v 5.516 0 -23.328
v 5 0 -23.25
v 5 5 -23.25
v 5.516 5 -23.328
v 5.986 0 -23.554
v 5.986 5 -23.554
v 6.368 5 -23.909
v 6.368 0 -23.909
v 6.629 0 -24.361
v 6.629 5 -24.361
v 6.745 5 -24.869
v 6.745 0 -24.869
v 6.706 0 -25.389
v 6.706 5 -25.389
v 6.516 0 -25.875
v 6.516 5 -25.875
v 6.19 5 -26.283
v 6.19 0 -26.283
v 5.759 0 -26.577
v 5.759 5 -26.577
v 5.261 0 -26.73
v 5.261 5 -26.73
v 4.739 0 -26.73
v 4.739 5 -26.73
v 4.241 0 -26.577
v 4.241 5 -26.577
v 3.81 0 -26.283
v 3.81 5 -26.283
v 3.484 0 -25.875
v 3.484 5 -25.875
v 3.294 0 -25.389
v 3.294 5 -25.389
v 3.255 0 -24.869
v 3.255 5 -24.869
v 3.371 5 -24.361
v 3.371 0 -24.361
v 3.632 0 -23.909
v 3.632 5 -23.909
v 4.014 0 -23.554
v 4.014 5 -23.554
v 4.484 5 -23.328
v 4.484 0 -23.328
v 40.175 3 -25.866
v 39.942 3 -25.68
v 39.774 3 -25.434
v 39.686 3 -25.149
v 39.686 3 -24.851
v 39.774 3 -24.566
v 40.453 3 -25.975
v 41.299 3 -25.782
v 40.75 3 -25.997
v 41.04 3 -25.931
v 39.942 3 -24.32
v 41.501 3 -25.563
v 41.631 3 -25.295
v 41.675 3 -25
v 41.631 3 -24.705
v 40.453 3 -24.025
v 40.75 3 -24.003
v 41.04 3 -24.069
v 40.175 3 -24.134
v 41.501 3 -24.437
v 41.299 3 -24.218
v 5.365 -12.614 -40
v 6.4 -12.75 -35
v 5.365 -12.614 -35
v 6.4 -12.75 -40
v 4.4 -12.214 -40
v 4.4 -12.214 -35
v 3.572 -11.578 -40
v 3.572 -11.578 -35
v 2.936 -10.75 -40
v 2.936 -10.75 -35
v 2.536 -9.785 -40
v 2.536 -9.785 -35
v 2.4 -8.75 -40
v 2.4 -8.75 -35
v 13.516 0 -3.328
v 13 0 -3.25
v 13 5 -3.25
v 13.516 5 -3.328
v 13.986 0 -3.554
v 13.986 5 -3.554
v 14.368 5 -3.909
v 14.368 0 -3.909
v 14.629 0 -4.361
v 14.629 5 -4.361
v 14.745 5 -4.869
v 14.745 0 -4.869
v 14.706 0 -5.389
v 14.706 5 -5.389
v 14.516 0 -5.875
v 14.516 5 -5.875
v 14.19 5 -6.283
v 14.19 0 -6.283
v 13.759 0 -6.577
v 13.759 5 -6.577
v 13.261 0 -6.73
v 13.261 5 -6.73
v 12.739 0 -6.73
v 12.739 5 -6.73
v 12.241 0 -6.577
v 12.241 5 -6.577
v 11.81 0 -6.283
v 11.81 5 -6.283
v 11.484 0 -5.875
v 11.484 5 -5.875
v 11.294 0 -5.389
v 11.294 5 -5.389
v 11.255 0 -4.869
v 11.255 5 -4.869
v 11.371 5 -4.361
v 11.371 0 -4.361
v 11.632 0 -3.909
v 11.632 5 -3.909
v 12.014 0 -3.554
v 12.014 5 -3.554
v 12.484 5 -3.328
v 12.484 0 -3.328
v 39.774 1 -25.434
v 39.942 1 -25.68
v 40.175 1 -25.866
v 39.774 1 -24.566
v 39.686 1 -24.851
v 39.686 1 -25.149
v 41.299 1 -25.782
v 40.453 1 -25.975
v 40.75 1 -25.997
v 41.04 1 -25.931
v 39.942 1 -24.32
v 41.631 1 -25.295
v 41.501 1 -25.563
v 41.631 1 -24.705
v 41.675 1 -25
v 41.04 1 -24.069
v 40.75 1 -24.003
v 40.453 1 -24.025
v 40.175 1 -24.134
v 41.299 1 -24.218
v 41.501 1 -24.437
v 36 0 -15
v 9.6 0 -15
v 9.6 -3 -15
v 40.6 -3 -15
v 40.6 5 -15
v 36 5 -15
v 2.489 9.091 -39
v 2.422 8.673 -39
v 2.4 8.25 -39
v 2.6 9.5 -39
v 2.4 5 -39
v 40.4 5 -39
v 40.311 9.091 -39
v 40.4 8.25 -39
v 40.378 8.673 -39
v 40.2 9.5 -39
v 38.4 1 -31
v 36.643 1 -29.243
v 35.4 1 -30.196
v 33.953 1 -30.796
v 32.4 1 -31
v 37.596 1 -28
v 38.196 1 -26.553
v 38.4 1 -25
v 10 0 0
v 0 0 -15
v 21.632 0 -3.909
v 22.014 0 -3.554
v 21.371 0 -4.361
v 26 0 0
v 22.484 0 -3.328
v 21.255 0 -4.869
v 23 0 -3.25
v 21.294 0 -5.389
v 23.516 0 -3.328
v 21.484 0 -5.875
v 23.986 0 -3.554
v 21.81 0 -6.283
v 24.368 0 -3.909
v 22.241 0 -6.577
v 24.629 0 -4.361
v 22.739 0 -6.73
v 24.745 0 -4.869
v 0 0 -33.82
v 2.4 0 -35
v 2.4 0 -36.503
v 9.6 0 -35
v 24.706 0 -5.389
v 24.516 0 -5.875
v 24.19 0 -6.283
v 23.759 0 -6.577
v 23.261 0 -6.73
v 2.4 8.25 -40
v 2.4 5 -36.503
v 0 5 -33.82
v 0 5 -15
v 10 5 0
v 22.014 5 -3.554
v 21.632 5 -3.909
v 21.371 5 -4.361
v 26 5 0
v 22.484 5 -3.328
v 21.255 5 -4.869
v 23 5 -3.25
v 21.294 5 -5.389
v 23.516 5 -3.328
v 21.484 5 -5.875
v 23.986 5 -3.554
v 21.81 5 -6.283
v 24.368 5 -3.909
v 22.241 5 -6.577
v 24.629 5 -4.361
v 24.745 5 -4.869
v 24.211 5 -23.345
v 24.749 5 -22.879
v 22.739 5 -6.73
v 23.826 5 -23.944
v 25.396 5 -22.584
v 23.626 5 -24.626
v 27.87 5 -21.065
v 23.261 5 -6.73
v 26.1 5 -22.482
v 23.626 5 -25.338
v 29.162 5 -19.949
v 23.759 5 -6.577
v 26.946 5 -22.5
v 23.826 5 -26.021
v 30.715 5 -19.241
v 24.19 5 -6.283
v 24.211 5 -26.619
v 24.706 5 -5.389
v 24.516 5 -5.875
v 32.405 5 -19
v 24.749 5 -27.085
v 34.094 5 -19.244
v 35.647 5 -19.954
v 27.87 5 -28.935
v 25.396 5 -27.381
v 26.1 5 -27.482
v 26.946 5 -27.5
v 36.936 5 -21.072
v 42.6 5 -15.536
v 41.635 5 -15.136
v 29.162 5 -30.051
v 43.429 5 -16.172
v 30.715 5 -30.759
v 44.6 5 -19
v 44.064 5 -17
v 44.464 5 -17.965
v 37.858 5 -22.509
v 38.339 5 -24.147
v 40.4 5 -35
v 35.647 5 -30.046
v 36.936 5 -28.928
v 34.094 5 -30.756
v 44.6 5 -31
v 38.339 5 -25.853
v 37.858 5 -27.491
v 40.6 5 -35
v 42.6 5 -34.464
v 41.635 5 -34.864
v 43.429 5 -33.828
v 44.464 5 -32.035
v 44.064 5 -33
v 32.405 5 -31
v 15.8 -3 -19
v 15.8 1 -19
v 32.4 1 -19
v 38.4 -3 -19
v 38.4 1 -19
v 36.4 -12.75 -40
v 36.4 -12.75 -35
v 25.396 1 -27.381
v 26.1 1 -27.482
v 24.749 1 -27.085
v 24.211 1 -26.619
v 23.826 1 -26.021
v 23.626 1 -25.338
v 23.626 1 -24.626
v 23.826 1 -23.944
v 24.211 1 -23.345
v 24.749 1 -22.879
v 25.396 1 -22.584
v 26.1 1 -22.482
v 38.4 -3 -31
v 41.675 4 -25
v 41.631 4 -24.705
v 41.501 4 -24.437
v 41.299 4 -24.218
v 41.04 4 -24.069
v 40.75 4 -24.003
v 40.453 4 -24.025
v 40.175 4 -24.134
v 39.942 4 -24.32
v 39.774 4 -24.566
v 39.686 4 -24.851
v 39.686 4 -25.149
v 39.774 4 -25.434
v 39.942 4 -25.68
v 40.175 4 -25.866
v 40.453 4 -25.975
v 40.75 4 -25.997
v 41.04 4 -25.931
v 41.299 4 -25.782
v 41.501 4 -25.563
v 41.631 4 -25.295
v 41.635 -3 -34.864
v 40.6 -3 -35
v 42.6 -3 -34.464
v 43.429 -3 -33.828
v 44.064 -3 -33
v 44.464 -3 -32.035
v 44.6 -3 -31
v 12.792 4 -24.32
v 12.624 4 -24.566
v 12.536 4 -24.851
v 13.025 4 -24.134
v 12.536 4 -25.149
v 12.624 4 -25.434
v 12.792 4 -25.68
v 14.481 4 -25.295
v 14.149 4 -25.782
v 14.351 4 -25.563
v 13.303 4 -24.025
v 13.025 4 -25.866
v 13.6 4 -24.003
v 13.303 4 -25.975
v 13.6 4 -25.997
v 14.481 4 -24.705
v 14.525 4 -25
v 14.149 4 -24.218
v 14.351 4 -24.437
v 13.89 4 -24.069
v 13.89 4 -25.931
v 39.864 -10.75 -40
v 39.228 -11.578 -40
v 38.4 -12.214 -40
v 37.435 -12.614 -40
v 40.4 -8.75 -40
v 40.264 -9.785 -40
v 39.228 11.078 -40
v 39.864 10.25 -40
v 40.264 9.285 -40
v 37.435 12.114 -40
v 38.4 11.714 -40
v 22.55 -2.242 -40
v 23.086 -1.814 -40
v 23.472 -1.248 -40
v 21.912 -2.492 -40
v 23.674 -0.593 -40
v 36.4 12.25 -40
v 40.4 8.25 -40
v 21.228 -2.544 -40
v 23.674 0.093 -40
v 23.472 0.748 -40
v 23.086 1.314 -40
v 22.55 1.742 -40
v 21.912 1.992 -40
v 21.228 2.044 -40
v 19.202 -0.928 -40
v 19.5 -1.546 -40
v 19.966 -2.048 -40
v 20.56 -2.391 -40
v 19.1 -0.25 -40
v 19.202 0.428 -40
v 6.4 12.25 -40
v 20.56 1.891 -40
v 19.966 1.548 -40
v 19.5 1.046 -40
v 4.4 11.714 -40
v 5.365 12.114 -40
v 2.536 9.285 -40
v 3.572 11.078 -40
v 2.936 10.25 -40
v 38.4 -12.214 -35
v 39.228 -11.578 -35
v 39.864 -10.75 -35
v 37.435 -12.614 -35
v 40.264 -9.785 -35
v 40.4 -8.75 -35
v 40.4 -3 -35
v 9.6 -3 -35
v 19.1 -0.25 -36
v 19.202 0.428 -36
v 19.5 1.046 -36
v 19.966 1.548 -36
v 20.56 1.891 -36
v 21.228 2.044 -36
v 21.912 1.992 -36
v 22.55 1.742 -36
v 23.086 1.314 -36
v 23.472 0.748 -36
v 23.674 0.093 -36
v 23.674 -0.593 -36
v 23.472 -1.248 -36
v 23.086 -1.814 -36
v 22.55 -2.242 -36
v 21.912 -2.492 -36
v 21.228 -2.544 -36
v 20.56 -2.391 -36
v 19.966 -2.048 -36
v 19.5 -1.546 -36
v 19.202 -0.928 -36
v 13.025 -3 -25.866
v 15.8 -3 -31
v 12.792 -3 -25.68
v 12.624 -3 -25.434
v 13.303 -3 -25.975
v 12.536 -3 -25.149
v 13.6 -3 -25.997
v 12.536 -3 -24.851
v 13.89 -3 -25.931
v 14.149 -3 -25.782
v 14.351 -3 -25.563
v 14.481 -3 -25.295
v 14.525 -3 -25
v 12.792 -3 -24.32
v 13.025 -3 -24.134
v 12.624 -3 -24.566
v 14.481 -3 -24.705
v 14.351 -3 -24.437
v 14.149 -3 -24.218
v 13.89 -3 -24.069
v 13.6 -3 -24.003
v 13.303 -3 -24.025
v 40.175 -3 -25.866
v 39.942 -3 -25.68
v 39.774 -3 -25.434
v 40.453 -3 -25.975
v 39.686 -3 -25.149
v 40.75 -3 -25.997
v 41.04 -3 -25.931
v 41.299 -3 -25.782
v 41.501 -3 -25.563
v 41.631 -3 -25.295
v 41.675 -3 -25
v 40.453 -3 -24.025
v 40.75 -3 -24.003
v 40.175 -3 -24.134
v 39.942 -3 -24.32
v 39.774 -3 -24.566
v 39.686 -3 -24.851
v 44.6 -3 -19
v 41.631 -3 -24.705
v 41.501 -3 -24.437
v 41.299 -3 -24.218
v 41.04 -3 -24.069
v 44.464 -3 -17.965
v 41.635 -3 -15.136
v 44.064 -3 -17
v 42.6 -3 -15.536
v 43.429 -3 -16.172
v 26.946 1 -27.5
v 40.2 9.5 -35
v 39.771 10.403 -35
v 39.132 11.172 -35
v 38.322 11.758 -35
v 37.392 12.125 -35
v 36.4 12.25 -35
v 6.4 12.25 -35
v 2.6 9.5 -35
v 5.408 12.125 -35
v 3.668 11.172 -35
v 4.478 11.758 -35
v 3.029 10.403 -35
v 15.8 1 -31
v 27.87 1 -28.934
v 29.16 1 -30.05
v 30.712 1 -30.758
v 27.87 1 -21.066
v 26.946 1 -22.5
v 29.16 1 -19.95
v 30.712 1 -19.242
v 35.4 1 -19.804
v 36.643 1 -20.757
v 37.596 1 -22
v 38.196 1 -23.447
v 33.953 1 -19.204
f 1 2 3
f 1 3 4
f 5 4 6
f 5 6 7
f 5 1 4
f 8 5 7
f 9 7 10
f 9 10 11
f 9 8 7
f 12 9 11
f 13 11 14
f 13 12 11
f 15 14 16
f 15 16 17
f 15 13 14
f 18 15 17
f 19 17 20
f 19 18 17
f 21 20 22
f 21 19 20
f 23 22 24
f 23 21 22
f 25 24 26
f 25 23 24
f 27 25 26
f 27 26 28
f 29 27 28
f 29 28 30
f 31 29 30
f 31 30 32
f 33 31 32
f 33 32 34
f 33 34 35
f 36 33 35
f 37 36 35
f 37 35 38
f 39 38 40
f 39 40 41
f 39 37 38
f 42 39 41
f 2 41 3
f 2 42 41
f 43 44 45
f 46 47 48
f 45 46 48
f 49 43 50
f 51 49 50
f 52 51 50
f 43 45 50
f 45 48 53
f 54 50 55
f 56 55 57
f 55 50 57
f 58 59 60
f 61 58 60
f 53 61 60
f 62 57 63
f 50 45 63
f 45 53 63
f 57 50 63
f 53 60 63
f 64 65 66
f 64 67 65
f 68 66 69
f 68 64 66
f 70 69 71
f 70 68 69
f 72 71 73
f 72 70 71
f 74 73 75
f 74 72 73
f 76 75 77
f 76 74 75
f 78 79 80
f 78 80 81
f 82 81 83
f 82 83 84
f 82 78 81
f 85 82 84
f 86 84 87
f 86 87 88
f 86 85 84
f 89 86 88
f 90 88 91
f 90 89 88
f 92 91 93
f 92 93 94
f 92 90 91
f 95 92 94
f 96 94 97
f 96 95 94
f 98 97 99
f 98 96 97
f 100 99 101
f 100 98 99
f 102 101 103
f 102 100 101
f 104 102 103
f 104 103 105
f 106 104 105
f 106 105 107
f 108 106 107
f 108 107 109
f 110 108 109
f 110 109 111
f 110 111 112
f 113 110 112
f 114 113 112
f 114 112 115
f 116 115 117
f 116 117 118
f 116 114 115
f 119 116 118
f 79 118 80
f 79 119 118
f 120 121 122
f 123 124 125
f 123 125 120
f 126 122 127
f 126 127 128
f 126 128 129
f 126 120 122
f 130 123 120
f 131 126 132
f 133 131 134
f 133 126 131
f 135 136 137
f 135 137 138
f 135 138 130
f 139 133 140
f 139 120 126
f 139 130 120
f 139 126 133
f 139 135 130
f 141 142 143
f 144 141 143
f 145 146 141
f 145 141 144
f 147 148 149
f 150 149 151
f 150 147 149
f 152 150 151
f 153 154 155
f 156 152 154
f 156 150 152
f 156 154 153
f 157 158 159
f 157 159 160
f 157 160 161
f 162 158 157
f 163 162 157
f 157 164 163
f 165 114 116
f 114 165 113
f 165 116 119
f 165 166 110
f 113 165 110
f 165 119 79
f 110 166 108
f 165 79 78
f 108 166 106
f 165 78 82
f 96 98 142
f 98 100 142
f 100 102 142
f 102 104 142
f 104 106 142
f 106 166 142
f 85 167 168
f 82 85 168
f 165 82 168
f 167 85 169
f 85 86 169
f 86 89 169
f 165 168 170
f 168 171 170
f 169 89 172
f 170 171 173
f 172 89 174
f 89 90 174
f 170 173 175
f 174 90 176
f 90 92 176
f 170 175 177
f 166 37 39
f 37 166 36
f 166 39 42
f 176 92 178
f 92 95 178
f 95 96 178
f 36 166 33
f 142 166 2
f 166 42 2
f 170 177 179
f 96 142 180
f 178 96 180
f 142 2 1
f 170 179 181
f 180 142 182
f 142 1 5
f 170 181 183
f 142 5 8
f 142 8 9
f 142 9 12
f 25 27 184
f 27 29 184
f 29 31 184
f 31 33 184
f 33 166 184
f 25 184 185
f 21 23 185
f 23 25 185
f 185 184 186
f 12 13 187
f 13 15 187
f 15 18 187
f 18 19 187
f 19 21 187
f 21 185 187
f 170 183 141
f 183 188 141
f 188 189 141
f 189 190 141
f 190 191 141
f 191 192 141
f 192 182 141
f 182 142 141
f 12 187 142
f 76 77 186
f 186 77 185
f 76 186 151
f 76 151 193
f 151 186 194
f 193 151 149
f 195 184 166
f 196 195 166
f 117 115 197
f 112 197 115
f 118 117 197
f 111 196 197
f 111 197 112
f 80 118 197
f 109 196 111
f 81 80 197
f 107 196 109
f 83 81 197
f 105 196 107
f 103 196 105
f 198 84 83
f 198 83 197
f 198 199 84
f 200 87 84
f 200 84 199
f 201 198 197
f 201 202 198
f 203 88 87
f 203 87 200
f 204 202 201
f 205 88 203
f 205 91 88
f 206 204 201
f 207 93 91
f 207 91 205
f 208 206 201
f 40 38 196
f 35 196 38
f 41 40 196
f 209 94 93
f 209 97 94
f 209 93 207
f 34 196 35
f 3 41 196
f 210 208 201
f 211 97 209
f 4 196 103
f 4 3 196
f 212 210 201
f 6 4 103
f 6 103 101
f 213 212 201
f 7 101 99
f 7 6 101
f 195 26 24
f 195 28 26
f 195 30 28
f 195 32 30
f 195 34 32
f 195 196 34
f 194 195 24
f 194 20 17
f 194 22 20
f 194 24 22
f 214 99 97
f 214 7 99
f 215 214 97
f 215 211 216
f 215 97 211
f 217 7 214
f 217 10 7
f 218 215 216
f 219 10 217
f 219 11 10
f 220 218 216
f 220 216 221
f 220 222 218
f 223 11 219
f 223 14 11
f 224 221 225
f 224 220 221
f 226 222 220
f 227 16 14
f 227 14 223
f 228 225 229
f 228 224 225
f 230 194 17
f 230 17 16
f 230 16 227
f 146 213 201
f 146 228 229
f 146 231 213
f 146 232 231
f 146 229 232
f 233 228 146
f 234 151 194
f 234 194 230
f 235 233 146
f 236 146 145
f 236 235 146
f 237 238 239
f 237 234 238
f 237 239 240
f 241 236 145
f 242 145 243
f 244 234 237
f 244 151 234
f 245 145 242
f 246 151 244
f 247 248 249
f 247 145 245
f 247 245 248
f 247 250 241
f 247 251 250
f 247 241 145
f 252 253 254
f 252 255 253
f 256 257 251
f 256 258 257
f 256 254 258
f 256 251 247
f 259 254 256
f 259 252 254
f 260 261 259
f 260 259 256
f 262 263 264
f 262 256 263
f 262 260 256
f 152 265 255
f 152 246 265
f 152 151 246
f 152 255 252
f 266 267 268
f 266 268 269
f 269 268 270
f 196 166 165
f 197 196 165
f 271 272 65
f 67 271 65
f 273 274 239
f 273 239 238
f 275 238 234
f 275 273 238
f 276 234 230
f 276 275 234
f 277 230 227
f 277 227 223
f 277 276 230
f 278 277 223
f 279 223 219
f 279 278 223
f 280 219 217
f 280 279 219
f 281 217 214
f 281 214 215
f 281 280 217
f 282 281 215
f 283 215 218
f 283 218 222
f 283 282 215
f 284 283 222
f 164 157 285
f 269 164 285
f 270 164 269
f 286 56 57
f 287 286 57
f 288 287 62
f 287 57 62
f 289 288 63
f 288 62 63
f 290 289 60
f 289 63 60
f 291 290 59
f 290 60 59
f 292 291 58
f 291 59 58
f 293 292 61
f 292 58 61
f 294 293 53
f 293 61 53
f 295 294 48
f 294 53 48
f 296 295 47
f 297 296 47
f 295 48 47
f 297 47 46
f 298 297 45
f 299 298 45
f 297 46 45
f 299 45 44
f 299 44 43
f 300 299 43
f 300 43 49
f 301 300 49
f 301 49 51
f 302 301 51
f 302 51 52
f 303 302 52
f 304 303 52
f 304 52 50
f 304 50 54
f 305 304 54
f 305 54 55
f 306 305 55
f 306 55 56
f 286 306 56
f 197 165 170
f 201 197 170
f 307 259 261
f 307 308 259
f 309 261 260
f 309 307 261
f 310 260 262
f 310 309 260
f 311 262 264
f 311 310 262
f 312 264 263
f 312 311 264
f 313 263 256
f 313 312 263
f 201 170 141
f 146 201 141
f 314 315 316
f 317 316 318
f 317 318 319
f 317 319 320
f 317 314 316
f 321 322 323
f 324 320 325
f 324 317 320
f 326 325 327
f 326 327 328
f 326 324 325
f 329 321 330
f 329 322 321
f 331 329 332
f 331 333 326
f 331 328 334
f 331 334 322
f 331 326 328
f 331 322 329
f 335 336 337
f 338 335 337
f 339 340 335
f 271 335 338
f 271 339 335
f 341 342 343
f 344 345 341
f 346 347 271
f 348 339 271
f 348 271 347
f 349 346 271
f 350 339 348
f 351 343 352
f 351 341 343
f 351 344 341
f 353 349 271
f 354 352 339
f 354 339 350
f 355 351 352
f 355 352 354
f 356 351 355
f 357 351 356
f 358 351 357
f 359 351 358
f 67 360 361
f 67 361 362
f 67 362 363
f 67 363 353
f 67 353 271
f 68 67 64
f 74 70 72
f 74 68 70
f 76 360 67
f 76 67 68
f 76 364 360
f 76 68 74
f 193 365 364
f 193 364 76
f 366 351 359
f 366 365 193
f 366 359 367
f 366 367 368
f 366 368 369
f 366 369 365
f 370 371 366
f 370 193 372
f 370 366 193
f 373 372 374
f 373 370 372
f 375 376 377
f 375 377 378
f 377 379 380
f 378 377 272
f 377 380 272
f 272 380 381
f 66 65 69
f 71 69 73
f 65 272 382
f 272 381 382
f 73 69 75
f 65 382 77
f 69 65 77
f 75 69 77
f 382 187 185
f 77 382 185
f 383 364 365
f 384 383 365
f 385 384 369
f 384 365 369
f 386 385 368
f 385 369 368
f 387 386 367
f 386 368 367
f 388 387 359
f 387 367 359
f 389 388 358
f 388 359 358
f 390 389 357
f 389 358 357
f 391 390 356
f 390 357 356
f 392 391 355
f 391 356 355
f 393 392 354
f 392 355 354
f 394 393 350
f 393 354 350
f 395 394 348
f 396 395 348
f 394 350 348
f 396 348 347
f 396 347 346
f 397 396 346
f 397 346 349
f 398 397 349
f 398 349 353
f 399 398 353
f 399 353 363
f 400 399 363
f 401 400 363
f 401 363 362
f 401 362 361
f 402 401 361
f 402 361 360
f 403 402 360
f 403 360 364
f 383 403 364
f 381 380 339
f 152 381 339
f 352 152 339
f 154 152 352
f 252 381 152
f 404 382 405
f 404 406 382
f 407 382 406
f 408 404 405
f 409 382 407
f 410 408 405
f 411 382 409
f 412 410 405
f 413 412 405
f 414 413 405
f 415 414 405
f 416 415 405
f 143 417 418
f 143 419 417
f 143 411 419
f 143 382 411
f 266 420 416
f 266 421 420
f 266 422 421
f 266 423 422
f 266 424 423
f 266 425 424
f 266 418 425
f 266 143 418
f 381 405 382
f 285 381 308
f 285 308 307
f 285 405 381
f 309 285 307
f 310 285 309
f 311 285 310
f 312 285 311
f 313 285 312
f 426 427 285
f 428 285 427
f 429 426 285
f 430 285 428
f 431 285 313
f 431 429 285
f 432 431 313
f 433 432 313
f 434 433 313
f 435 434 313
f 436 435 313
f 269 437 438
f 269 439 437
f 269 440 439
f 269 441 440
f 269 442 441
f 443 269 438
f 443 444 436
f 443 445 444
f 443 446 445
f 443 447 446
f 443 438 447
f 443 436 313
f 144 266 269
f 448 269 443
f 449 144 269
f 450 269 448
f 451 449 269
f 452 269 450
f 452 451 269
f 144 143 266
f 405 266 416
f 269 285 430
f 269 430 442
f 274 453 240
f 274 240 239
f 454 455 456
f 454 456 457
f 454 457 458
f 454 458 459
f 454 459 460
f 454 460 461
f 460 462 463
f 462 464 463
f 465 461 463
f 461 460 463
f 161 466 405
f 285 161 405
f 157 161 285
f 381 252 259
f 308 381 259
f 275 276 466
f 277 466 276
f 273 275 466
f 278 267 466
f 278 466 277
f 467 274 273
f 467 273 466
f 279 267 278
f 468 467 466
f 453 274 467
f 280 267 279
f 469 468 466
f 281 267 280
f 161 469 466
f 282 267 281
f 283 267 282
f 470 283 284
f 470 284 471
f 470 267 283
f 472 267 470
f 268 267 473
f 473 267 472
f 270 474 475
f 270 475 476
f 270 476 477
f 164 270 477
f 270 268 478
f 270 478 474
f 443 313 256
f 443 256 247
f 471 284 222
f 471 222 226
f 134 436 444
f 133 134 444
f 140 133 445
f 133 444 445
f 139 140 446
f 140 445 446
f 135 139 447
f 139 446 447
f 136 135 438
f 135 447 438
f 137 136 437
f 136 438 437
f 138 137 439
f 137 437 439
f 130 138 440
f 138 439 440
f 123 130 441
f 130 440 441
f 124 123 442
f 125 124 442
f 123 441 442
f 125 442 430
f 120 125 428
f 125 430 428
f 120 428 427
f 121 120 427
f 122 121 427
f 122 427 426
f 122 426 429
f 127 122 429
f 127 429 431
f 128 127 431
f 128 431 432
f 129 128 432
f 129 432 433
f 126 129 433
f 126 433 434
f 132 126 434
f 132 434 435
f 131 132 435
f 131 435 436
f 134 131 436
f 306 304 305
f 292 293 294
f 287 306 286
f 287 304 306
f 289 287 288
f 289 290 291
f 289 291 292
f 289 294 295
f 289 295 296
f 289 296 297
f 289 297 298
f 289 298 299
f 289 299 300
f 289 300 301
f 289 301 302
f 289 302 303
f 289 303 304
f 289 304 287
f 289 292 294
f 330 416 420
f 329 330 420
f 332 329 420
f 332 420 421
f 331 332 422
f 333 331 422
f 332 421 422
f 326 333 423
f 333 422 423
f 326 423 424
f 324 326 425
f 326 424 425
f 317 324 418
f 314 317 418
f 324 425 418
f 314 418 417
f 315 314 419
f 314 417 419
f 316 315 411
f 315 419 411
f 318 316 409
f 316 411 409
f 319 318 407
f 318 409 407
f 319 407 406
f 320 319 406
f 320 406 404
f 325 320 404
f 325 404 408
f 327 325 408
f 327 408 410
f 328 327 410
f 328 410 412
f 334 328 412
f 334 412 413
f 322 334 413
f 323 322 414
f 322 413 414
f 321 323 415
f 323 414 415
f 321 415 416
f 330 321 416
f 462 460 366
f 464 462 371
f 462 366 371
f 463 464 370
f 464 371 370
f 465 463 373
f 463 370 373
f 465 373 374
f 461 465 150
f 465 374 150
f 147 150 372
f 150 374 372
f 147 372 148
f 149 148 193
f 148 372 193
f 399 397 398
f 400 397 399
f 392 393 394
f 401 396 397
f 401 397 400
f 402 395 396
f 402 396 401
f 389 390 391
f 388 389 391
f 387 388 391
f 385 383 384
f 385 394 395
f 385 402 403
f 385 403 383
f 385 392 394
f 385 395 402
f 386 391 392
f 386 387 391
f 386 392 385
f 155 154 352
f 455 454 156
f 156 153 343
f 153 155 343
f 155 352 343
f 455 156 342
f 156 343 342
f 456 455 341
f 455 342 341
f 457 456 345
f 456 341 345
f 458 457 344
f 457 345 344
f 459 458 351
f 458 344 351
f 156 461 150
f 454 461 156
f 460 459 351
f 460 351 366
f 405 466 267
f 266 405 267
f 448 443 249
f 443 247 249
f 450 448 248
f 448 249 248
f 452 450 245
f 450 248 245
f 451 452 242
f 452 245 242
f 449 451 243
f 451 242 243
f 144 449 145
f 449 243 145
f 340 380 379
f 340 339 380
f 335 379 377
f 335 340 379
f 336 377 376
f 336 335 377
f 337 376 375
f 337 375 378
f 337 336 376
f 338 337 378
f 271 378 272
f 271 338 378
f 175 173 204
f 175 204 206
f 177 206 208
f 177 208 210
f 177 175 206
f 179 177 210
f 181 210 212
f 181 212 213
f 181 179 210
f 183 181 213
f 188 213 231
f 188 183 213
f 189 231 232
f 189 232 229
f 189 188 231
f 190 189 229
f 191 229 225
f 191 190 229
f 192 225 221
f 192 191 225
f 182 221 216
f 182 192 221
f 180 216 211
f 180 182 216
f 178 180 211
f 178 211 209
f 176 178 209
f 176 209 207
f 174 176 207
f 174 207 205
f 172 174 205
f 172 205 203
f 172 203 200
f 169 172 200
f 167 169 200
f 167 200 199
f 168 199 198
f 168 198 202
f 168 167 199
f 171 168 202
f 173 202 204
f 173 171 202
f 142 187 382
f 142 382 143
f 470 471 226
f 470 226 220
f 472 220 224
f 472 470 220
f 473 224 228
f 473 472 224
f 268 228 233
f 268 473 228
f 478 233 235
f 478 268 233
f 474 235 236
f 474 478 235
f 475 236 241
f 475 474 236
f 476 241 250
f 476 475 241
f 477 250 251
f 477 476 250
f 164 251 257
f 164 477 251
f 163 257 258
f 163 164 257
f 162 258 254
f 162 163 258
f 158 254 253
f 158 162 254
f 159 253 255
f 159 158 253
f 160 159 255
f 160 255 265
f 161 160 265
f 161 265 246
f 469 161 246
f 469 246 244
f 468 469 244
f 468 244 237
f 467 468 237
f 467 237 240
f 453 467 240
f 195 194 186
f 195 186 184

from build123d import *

# Parameters (mm, degrees)
SKETCH1_R           = 1.75
BOSS_EXTRUDE1_DEPTH = 5
SKETCH3_W           = 35
SKETCH3_H           = 20
SKETCH3_W_2         = 22.6
SKETCH3_H_2         = 12
BOSS_EXTRUDE4_DEPTH = 3
SKETCH6_W           = 15.399861764
SKETCH6_H           = 20
CUT_EXTRUDE2_DEPTH  = 76.166481892
SKETCH9_R           = 1
CUT_EXTRUDE4_DEPTH  = 7
SKETCH24_W          = 38
SKETCH24_H          = 25
BOSS_EXTRUDE8_DEPTH = 5
SKETCH27_R          = 2.3
CUT_EXTRUDE15_DEPTH = 4
FILLET9_R           = 4
SKETCH3_5_W         = 22.6
SKETCH3_5_H         = 12
CUT_EXTRUDE16_DEPTH = 3
BOSS_EXTRUDE9_DEPTH = 2
CUT_EXTRUDE18_DEPTH = 4
CUT_EXTRUDE19_DEPTH = 66.796921133
SKETCH37_W          = 38
SKETCH37_H          = 4.5
CUT_EXTRUDE20_DEPTH = 4


with BuildPart() as part:
    # Sketch1 → Boss-Extrude1 (new body)
    with BuildSketch(Plane(origin=(0, 0, 0), x_dir=(1, 0, 0), z_dir=(0, 1, 0))):
        Polygon((0, 33.819660113), (0, 15), (10, 0), (26, 0), (36, 15), (60, 15), (60, 35), (36, 35), (26, 45), (10, 45), align=None)
        with Locations((13, 5)):
            Circle(SKETCH1_R, mode=Mode.SUBTRACT)
        with Locations((23, 5)):
            Circle(SKETCH1_R, mode=Mode.SUBTRACT)
        with Locations((5, 25)):
            Circle(SKETCH1_R, mode=Mode.SUBTRACT)
    extrude(amount=BOSS_EXTRUDE1_DEPTH)

    # Sketch3 → Boss-Extrude4 (add)
    with BuildSketch(Plane.XZ):
        with Locations((27.100138236, -25)):
            Rectangle(SKETCH3_W, SKETCH3_H)
        with Locations((27.100138236, -25)):
            Rectangle(SKETCH3_W_2, SKETCH3_H_2, mode=Mode.SUBTRACT)
    extrude(amount=BOSS_EXTRUDE4_DEPTH)

    # Sketch6 → Cut-Extrude2 (cut, through all)
    with BuildSketch(Plane.XZ):
        with Locations((52.300069118, -25)):
            Rectangle(SKETCH6_W, SKETCH6_H)
    extrude(amount=-CUT_EXTRUDE2_DEPTH, mode=Mode.SUBTRACT)

    # Sketch9 → Cut-Extrude4 (cut)
    with BuildSketch(Plane.XZ.offset(3)):
        with Locations((13.525138236, -25)):
            Circle(SKETCH9_R)
        with Locations((40.675138236, -25)):
            Circle(SKETCH9_R)
    extrude(amount=-CUT_EXTRUDE4_DEPTH, mode=Mode.SUBTRACT)

    # Sketch24 → Boss-Extrude8 (add)
    with BuildSketch(Plane(origin=(0, 0, -35), x_dir=(-1, 0, 0), z_dir=(0, 0, -1))):
        with Locations((-21.4, -0.25)):
            Rectangle(SKETCH24_W, SKETCH24_H)
    extrude(amount=BOSS_EXTRUDE8_DEPTH)

    # Sketch27 → Cut-Extrude15 (cut)
    with BuildSketch(Plane(origin=(0, 0, -40), x_dir=(-1, 0, 0), z_dir=(0, 0, -1))):
        with Locations((-21.4, -0.25)):
            Circle(SKETCH27_R)
    extrude(amount=-CUT_EXTRUDE15_DEPTH, mode=Mode.SUBTRACT)

    # Fillet9
    fillet9_edges = [part.edges().sort_by_distance(p)[0] for p in [
        (44.600138236, 1, -35),
        (44.600138236, 1, -15),
        (2.4, 12.25, -37.5),
        (2.4, -12.75, -37.5),
        (40.4, 12.25, -37.5),
        (40.4, -12.75, -37.5),
    ]]
    fillet(fillet9_edges, radius=FILLET9_R)

    # Sketch3<5> → Cut-Extrude16 (cut)
    with BuildSketch(Plane.XZ):
        with Locations((27.100138236, -25)):
            Rectangle(SKETCH3_5_W, SKETCH3_5_H)
    extrude(amount=-CUT_EXTRUDE16_DEPTH, mode=Mode.SUBTRACT)

    # Sketch34 → Boss-Extrude9 (add)
    with BuildSketch(Plane.XZ.offset(-3)):
        Polygon((38.400138236, -31), (44.400138238, -31), (44.400138238, -25), (44.400138238, -19), (38.400138236, -19), (15.800138236, -19), (15.800138236, -31), align=None)
    extrude(amount=BOSS_EXTRUDE9_DEPTH)

    # Sketch35 → Cut-Extrude18 (cut)
    with BuildSketch(Plane.XZ.offset(-1)):
        with BuildLine():
            Line((26.100324519, -22.482250986), (26.945782176, -22.499999995))
            ThreePointArc((26.945782176, -22.499999995), (38.400138236, -25), (26.945782176, -27.500000005))
            Line((26.945782176, -27.500000005), (26.100324492, -27.482252247))
            ThreePointArc((26.100324492, -27.482252247), (23.600323888, -24.982251603), (26.100324519, -22.482250986))
        make_face()
    extrude(amount=-CUT_EXTRUDE18_DEPTH, mode=Mode.SUBTRACT)

    # Sketch36 → Cut-Extrude19 (cut, through all)
    with BuildSketch(Plane(origin=(0, 5, 0), x_dir=(1, 0, 0), z_dir=(0, 1, 0))):
        Polygon((5.527864045, 40), (31, 40), (26, 45), (10, 45), align=None)
    extrude(amount=-CUT_EXTRUDE19_DEPTH, mode=Mode.SUBTRACT)

    # Sketch37 → Cut-Extrude20 (cut)
    with BuildSketch(Plane.XY.offset(-35)):
        with Locations((21.4, 7.25)):
            Rectangle(SKETCH37_W, SKETCH37_H)
    extrude(amount=-CUT_EXTRUDE20_DEPTH, mode=Mode.SUBTRACT)


solid = part.part
